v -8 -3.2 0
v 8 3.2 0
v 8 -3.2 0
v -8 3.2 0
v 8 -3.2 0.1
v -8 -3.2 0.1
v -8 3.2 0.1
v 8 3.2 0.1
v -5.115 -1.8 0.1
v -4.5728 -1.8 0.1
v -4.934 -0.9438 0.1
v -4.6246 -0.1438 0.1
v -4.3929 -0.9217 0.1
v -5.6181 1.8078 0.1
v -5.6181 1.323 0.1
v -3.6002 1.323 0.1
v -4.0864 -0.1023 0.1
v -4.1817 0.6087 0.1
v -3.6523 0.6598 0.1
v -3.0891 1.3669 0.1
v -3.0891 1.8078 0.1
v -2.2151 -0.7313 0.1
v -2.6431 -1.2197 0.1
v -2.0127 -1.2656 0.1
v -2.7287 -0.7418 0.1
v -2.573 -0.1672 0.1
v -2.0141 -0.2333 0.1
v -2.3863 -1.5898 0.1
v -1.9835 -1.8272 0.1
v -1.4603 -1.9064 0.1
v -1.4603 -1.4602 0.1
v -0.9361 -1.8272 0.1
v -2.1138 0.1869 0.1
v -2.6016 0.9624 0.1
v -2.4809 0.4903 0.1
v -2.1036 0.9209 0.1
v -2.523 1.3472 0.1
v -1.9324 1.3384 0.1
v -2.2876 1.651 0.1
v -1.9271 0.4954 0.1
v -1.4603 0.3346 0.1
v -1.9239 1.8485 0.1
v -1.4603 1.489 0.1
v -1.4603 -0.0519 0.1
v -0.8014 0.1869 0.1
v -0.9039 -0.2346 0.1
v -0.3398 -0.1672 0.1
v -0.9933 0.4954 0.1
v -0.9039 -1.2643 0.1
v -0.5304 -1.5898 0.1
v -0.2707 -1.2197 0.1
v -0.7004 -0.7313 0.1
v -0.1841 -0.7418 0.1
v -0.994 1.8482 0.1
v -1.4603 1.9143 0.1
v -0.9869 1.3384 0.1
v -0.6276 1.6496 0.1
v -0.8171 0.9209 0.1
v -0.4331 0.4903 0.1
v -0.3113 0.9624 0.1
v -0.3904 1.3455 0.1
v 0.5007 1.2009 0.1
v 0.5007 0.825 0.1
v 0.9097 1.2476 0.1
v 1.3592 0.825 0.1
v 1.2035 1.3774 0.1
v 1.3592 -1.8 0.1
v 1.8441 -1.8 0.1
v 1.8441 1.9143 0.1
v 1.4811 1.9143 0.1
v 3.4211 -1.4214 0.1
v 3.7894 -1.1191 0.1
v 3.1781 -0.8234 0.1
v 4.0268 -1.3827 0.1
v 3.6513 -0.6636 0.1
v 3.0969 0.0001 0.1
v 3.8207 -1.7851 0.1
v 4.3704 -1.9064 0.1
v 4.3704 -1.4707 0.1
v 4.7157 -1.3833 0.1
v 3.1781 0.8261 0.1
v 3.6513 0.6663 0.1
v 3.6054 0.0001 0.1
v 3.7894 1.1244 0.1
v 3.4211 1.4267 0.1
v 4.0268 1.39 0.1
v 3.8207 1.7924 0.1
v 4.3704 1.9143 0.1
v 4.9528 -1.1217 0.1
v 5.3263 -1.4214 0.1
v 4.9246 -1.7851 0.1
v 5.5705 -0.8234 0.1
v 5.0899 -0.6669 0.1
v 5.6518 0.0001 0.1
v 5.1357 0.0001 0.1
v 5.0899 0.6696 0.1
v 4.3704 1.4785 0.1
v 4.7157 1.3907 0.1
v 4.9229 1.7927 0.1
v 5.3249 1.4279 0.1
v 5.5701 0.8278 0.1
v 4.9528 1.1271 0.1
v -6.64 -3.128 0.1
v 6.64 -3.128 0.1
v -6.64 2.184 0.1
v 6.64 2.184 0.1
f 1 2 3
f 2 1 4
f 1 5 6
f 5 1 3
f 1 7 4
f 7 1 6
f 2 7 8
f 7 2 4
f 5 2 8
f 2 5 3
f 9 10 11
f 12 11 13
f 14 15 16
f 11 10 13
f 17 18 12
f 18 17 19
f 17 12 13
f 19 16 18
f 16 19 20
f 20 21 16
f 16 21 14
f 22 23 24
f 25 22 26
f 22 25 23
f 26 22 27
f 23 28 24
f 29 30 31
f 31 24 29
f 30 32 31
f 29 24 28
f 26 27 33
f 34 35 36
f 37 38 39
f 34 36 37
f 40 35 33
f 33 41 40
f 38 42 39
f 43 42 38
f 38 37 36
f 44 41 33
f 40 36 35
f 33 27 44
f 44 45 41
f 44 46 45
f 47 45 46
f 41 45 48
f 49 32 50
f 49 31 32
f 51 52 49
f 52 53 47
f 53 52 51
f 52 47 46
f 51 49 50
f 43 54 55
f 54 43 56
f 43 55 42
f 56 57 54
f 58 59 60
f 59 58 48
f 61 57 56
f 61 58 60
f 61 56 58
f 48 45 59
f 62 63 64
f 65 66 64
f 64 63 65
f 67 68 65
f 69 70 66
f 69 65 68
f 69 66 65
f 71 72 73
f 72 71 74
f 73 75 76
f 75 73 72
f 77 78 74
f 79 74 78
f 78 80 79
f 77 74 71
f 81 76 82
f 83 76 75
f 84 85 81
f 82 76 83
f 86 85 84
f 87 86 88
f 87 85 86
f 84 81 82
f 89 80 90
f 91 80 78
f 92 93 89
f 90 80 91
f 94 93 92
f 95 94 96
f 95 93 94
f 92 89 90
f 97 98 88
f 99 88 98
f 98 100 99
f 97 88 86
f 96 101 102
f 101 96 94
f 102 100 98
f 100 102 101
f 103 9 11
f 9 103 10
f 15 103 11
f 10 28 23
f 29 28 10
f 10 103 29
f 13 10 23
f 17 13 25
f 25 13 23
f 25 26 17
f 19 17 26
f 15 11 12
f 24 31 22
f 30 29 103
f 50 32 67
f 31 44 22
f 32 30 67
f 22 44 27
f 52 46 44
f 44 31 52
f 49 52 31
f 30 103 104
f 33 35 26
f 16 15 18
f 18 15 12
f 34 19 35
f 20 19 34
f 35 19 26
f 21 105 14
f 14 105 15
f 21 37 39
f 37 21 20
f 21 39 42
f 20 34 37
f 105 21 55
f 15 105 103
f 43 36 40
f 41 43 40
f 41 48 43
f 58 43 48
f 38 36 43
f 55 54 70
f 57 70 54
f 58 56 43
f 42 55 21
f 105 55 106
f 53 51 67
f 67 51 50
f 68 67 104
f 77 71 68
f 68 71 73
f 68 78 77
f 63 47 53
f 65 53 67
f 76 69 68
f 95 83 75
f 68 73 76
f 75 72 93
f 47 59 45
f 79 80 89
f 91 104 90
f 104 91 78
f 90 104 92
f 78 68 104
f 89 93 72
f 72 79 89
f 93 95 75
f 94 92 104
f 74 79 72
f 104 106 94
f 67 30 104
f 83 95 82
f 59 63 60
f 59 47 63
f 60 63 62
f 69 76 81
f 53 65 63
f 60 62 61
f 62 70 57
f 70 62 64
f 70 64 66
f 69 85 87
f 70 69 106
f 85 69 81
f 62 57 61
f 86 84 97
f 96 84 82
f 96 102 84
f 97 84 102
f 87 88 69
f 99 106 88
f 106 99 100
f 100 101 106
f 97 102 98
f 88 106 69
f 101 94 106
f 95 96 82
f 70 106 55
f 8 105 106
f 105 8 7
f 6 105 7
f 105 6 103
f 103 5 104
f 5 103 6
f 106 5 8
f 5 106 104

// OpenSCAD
// file: ../p/box5-12.scad
use <../lib.scad>
function ldraw_lib__box5_12() = [
// 0 Box with 5 Faces without Any Edges
// 0 Name: box5-12.dat
// 0 Author: Chris Dee [cwdee]
// 0 !LDRAW_ORG Primitive UPDATE 2009-02
// 0 !LICENSE Licensed under CC BY 2.0 and CC BY 4.0 : see CAreadme.txt
// 
// 0 BFC CERTIFY CCW
  [0,"BFC","CERTIFY"],
  [0,"BFC","CCW"],
// 
// 0 !HISTORY 2009-09-03 [PTadmin] Official Update 2009-02
// 
// 
// 4 16 1 1 1 1 1 -1 -1 1 -1 -1 1 1
  [4,16,1,1,1,1,1,-1,-1,1,-1,-1,1,1],
// 4 16 -1 0 1 1 0 1 1 1 1 -1 1 1
  [4,16,-1,0,1,1,0,1,1,1,1,-1,1,1],
// 4 16 -1 0 -1 -1 0 1 -1 1 1 -1 1 -1
  [4,16,-1,0,-1,-1,0,1,-1,1,1,-1,1,-1],
// 4 16 1 0 -1 -1 0 -1 -1 1 -1 1 1 -1
  [4,16,1,0,-1,-1,0,-1,-1,1,-1,1,1,-1],
// 4 16 1 0 1 1 0 -1 1 1 -1 1 1 1
  [4,16,1,0,1,1,0,-1,1,1,-1,1,1,1],
// 0
];
module ldraw_lib__box5_12(step=0, col=false, unit=2/5, alt=false, line=0.2, solid=!$preview)
    makepoly(ldraw_lib__box5_12(), step=step, col=col, unit=unit, alt=alt, line=line, solid=solid);
ldraw_lib__box5_12(line=0.2);
// main file
use <../lib.scad>
use <../p/box5-12.scad>
use <s/191945s01.scad>
function ldraw_lib__191945b() = [
// 0 Sticker  0.8 x  2 with White "7810"
// 0 Name: 191945b.dat
// 0 Author: Steffen [Steffen]
// 0 !LDRAW_ORG Part UPDATE 2012-01
// 0 !LICENSE Licensed under CC BY 2.0 and CC BY 4.0 : see CAreadme.txt
// 
// 0 BFC CERTIFY CCW
  [0,"BFC","CERTIFY"],
  [0,"BFC","CCW"],
// 
// 0 !HISTORY 2012-03-30 [PTadmin] Official Update 2012-01
// 
// 
// 1 16 0 -0.25 0 20 0 0 0 0.25 0 0 0 -8 box5-12.dat
  [1,16,0,-0.25,0,20,0,0,0,0.25,0,0,0,-8, ldraw_lib__box5_12()],
// 1 16 0 -0.25 -4.5 0.415 0 0 0 1 0 0 0 0.415 s\191945s01.dat
  [1,16,0,-0.25,-4.5,0.415,0,0,0,1,0,0,0,0.415, ldraw_lib__s__191945s01()],
// 4 16 -20 -0.25 8 -16.6 -0.25 5.46 16.6 -0.25 5.46 20 -0.25 8
  [4,16,-20,-0.25,8,-16.6,-0.25,5.46,16.6,-0.25,5.46,20,-0.25,8],
// 4 16 -16.6 -0.25 5.46 -20 -0.25 8 -20 -0.25 -8 -16.6 -0.25 -7.82
  [4,16,-16.6,-0.25,5.46,-20,-0.25,8,-20,-0.25,-8,-16.6,-0.25,-7.82],
// 4 16 -16.6 -0.25 -7.82 -20 -0.25 -8 20 -0.25 -8 16.6 -0.25 -7.82
  [4,16,-16.6,-0.25,-7.82,-20,-0.25,-8,20,-0.25,-8,16.6,-0.25,-7.82],
// 4 16 20 -0.25 8 16.6 -0.25 5.46 16.6 -0.25 -7.82 20 -0.25 -8
  [4,16,20,-0.25,8,16.6,-0.25,5.46,16.6,-0.25,-7.82,20,-0.25,-8],
// 0
];
module ldraw_lib__191945b(step=0, col=false, unit=2/5, alt=false, line=0.2, solid=!$preview)
    makepoly(ldraw_lib__191945b(), step=step, col=col, unit=unit, alt=alt, line=line, solid=solid);
ldraw_lib__191945b(line=0.2);
